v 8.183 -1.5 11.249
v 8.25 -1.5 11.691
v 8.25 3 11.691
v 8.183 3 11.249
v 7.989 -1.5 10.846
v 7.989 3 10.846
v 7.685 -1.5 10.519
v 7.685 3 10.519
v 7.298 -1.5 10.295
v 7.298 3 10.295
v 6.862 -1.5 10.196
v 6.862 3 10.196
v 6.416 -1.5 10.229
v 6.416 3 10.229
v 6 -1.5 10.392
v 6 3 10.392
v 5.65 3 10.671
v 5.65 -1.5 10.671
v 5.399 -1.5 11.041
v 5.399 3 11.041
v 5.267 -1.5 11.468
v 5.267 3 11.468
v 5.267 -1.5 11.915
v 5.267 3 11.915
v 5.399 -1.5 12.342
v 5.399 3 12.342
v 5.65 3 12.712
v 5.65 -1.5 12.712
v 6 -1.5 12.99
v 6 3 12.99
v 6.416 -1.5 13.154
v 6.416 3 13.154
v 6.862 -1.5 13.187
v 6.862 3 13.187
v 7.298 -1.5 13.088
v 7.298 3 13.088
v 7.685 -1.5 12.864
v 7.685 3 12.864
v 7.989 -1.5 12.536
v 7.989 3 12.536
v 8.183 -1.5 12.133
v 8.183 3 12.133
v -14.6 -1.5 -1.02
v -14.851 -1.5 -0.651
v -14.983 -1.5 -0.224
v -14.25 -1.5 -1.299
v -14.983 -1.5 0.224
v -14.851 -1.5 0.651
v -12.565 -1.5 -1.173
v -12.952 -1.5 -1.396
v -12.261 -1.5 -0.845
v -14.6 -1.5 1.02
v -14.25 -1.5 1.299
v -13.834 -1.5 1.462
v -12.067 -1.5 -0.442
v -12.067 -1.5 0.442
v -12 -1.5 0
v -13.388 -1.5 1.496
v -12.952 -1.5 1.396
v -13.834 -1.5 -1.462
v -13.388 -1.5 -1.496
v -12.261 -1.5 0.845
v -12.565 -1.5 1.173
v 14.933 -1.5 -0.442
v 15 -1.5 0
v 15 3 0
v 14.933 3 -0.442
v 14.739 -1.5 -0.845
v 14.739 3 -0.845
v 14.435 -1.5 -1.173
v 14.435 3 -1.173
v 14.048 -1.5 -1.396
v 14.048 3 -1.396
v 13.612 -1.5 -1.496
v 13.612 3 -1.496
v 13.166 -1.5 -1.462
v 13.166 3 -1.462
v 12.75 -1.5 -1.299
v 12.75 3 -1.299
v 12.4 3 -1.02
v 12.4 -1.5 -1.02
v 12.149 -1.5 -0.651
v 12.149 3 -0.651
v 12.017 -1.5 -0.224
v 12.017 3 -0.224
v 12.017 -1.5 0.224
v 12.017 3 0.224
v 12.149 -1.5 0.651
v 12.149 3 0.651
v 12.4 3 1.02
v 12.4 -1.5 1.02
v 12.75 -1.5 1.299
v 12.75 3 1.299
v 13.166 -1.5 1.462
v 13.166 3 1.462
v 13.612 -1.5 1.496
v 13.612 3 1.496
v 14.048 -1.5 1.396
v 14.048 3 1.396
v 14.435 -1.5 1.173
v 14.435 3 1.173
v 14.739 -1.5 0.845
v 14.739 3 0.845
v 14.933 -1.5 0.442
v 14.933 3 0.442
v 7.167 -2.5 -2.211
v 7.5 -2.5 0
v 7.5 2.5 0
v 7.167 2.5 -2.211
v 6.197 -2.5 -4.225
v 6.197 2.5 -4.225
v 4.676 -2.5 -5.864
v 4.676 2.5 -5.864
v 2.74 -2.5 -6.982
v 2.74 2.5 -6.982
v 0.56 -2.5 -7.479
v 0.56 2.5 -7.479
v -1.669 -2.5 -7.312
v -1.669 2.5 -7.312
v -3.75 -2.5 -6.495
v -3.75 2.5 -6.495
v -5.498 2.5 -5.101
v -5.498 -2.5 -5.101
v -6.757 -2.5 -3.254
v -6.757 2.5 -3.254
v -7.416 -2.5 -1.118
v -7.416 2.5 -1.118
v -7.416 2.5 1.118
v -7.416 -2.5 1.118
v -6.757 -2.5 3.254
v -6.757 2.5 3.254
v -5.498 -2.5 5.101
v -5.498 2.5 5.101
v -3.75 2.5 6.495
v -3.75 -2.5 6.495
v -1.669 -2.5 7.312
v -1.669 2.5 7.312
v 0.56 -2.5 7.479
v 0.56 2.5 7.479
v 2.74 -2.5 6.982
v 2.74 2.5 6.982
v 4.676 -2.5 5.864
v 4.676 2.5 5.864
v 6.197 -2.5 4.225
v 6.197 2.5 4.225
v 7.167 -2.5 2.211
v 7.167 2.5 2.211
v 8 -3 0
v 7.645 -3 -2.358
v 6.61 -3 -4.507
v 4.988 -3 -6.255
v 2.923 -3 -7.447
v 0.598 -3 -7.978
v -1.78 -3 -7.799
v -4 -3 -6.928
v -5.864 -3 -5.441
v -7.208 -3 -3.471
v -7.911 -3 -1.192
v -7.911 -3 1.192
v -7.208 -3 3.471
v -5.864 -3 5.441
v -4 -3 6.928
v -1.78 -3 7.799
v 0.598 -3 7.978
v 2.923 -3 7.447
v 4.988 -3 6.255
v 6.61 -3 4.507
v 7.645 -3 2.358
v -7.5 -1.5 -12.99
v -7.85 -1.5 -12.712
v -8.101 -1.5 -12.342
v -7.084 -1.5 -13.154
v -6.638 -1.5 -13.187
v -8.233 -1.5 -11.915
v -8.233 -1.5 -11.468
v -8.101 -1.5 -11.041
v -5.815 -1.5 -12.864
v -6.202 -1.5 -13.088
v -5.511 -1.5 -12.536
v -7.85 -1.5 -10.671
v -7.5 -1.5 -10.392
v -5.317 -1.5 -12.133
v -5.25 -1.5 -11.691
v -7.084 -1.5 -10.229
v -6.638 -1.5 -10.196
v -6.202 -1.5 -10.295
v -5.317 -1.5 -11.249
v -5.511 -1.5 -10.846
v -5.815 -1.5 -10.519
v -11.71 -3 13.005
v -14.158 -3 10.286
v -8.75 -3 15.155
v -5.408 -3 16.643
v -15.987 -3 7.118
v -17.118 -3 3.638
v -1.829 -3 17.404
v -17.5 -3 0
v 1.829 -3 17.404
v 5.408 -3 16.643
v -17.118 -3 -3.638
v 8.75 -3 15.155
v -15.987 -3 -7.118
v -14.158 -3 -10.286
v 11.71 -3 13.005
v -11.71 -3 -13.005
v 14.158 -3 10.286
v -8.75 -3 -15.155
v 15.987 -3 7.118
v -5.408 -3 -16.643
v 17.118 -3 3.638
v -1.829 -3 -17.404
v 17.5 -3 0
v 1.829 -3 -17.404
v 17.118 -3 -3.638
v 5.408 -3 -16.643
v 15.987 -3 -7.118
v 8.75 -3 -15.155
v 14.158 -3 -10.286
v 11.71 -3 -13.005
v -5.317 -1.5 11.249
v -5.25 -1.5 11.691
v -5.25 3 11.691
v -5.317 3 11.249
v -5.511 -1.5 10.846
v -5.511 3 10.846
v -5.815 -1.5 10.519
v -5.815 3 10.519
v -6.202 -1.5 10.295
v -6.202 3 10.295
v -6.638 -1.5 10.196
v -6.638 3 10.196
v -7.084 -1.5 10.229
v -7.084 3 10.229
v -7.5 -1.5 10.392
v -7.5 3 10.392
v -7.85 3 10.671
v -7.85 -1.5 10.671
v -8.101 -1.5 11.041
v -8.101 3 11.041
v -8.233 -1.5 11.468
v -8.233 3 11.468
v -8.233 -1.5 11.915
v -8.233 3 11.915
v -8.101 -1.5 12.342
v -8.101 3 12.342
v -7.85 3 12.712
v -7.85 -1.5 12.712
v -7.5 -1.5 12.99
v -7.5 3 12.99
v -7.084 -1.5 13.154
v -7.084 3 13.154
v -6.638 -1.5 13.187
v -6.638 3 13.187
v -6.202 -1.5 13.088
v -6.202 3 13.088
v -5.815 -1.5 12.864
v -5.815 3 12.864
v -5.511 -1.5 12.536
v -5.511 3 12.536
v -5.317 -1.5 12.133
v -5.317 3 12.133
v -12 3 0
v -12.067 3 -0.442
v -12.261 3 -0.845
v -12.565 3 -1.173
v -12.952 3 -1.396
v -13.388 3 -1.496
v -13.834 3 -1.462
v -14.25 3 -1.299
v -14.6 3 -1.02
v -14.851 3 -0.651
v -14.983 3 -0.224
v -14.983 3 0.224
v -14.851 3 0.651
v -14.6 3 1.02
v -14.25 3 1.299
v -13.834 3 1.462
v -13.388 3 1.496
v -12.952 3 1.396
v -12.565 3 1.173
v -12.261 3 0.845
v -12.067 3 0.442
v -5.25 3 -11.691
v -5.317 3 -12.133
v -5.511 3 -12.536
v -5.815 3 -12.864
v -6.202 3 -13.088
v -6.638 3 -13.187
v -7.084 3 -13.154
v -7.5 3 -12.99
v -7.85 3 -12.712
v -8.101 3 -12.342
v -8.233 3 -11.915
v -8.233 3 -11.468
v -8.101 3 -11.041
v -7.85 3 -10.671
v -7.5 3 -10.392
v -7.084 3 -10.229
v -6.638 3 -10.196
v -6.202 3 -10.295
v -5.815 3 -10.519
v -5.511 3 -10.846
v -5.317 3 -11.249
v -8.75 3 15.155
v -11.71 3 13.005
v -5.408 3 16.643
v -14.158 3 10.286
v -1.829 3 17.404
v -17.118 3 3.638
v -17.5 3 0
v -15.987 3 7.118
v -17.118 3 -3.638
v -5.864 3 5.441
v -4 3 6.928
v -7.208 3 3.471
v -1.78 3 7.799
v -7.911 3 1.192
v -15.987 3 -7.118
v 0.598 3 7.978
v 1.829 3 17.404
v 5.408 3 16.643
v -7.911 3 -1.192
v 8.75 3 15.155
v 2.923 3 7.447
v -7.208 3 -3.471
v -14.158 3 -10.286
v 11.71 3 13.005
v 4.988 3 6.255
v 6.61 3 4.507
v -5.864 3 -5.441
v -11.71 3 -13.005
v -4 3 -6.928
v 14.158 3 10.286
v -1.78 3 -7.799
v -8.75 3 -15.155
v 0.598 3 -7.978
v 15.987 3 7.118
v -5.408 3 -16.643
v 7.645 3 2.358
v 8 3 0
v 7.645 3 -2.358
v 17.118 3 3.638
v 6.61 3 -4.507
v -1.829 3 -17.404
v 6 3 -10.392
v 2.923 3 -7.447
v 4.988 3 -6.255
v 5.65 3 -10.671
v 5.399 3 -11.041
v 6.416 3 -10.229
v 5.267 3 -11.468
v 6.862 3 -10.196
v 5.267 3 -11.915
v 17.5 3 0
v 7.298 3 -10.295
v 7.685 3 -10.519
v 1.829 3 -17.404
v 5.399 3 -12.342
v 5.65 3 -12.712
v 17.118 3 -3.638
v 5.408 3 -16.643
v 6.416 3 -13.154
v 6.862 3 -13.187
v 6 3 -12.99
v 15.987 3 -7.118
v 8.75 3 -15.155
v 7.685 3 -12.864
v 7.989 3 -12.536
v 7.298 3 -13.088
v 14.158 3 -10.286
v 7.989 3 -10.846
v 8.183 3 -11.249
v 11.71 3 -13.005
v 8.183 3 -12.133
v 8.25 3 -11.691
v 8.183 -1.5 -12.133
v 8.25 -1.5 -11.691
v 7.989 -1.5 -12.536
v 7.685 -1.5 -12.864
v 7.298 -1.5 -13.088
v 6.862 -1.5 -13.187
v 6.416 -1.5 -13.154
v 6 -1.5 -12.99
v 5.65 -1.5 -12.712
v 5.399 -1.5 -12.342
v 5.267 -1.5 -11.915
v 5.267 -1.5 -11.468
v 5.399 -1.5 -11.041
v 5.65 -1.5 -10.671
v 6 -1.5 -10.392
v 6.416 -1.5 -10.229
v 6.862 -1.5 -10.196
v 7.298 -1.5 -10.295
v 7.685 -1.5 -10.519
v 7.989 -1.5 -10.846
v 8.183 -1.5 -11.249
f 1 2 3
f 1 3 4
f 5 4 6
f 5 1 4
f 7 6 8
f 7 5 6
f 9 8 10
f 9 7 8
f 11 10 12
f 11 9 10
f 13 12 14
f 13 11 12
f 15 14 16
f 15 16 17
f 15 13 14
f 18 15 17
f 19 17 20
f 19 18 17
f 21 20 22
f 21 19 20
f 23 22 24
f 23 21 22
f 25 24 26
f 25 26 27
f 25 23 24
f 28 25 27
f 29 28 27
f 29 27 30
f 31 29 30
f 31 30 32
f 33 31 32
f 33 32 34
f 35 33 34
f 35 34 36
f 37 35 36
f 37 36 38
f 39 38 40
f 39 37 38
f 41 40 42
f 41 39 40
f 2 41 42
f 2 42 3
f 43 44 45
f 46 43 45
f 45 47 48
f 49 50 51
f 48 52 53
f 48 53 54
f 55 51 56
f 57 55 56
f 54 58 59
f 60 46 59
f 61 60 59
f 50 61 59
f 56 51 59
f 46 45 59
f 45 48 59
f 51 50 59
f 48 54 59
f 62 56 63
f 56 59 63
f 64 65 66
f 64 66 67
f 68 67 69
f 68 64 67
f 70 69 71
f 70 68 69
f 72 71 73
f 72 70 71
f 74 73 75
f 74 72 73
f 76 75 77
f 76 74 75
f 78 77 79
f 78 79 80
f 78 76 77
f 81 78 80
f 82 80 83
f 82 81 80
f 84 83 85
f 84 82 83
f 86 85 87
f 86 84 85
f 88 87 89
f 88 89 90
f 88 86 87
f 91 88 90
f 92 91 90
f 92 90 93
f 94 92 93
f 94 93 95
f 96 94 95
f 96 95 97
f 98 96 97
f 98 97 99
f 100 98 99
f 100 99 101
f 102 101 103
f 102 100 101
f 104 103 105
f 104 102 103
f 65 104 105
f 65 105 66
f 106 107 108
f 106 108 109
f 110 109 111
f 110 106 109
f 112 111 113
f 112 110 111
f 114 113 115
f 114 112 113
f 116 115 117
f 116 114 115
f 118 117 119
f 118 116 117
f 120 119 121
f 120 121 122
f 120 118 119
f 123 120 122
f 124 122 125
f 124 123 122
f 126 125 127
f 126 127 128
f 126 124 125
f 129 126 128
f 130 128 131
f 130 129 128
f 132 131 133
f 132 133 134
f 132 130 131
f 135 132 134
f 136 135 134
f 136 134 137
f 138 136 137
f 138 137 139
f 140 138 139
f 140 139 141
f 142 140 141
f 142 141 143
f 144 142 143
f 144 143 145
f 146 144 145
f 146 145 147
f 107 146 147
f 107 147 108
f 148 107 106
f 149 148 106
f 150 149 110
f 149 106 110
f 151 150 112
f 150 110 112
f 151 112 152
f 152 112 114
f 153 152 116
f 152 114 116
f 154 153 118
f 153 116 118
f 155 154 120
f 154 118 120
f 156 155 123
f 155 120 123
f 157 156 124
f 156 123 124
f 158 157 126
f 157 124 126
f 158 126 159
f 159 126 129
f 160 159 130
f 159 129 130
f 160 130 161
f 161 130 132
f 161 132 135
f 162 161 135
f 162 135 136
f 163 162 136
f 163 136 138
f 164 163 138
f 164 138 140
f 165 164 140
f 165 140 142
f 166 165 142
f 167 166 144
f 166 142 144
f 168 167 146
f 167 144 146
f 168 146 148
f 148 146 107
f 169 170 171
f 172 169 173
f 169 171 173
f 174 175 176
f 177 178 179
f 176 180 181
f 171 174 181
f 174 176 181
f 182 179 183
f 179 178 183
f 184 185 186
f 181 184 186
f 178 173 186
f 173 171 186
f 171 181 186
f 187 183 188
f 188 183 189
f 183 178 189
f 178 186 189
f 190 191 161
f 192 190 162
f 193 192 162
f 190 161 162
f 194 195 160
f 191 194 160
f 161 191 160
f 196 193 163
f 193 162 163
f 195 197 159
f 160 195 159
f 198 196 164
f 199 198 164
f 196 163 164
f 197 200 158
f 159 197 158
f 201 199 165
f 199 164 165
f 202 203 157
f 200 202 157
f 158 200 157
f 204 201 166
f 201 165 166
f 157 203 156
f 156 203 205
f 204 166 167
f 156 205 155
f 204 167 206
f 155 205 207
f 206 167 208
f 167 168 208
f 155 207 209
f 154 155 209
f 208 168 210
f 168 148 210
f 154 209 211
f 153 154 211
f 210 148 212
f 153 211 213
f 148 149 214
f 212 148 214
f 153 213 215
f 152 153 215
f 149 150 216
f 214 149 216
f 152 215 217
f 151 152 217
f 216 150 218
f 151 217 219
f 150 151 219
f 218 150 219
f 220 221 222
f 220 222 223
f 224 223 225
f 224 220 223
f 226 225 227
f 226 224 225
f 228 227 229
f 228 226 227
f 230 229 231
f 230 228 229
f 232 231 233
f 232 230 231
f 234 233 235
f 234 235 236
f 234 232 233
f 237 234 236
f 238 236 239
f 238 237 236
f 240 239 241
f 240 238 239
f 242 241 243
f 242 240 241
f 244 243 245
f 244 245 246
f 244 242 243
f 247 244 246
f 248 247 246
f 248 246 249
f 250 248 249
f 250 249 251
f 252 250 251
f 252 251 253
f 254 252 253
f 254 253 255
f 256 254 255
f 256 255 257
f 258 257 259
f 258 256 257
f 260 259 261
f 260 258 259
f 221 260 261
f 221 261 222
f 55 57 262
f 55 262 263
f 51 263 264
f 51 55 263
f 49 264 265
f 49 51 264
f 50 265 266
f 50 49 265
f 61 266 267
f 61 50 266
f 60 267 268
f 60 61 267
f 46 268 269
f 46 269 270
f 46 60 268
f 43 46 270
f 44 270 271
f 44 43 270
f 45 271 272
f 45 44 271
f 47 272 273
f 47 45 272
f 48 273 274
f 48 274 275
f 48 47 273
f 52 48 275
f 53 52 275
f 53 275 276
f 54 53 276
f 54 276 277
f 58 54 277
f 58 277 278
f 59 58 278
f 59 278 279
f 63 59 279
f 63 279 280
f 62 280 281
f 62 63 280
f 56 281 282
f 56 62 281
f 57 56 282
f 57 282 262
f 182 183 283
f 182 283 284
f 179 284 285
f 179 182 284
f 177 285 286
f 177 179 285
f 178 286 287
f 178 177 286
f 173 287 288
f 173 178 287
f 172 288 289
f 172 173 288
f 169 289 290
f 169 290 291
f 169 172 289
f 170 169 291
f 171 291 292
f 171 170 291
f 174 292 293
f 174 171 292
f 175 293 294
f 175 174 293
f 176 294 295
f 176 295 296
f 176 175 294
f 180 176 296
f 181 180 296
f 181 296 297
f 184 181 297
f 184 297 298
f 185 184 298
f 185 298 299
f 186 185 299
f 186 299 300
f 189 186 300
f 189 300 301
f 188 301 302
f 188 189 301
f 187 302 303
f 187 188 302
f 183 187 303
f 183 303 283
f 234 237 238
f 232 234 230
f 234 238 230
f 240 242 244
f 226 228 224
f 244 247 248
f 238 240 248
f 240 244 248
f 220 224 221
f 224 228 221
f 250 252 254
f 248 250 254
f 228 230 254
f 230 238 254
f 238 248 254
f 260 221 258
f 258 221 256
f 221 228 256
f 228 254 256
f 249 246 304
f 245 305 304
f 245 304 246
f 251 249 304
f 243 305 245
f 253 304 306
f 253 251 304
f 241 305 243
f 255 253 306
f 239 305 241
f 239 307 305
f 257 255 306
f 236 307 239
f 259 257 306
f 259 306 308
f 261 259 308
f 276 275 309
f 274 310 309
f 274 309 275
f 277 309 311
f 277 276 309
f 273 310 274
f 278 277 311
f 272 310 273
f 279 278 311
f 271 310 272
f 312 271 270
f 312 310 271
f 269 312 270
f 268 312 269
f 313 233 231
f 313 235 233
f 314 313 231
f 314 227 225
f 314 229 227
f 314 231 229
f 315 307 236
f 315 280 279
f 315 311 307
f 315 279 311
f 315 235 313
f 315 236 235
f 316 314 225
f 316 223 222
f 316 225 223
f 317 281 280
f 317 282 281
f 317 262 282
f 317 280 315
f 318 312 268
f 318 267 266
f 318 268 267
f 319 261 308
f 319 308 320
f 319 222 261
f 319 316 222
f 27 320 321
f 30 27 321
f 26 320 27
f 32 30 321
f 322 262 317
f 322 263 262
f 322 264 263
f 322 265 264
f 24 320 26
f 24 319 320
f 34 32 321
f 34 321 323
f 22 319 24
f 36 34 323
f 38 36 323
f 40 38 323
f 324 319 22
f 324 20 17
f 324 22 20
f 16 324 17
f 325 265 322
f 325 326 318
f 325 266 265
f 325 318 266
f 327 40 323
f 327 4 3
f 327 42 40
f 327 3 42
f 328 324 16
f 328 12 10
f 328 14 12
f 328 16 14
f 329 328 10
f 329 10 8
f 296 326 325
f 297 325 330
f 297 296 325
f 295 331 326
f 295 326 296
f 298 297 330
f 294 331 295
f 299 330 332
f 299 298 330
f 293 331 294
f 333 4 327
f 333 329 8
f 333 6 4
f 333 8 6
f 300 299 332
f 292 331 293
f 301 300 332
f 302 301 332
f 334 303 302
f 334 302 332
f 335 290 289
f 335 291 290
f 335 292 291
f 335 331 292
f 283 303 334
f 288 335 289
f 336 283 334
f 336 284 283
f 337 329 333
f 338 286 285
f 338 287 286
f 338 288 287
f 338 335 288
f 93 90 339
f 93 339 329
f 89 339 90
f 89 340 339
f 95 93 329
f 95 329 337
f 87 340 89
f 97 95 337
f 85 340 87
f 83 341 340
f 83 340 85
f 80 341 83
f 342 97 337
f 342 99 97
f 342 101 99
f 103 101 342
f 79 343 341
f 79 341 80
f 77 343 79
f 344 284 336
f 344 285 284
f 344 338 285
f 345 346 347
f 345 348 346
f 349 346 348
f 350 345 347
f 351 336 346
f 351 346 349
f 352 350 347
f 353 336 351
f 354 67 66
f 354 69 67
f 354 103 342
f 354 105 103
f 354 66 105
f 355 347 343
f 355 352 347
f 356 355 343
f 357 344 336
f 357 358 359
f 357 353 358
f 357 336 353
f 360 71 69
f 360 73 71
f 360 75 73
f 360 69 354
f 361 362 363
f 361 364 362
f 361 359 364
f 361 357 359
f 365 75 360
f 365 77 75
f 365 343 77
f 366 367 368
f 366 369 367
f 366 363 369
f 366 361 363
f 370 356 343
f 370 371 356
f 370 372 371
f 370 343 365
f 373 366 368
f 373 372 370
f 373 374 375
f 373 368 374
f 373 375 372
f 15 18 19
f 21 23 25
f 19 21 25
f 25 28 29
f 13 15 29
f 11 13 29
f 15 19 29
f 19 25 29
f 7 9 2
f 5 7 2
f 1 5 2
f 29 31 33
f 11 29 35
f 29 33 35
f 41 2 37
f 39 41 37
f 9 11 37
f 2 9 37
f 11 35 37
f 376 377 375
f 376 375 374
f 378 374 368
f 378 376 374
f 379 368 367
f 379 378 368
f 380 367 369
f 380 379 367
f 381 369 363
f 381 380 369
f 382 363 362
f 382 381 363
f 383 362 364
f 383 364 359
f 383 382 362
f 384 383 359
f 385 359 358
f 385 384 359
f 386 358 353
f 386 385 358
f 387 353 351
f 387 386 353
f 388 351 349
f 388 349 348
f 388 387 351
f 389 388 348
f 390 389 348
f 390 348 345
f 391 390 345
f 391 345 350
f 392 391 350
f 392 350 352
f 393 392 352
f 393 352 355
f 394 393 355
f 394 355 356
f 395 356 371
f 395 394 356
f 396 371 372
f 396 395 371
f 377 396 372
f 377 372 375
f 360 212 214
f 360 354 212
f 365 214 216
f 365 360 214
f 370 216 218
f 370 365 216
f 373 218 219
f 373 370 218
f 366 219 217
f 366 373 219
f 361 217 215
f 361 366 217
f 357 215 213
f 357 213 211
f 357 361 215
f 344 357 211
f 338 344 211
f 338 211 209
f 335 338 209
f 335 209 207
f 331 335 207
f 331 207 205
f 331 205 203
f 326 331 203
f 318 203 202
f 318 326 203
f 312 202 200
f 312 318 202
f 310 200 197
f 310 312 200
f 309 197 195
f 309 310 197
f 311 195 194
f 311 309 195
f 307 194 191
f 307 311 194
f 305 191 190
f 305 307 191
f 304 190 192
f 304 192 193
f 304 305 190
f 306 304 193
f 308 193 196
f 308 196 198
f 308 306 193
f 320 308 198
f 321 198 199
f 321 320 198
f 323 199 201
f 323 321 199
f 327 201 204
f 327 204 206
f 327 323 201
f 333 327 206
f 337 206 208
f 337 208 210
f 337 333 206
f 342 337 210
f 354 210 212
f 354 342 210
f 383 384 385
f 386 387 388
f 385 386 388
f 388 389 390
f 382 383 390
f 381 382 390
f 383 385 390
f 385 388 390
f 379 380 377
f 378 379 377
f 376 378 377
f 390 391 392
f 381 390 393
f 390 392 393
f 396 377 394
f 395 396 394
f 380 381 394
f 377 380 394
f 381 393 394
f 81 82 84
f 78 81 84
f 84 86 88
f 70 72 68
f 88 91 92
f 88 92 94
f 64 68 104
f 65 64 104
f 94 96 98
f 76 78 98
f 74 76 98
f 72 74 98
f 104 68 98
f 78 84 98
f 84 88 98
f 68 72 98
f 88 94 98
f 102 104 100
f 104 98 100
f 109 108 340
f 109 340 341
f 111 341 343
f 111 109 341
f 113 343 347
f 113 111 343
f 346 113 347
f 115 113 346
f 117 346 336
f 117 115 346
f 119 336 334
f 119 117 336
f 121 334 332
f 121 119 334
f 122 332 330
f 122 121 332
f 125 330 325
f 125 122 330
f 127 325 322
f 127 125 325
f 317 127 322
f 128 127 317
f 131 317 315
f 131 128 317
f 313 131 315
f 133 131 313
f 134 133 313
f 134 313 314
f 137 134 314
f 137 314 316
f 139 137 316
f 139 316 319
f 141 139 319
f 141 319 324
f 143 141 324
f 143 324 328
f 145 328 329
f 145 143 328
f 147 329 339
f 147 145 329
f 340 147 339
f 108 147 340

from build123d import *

# Parameters (mm, degrees)
SKETCH1_R           = 17.5
SKETCH1_R_2         = 1.5
SKETCH1_R_3         = 7.5
BOSS_EXTRUDE1_DEPTH = 3
SKETCH3_R           = 15
SKETCH3_R_2         = 12
BOSS_EXTRUDE2_DEPTH = 1.5
CHAMFER1_SIZE       = 0.5


with BuildPart() as part:
    # Sketch1 → Boss-Extrude1 (new body, symmetric)
    with BuildSketch(Plane(origin=(0, 0, 0), x_dir=(1, 0, 0), z_dir=(0, 1, 0))):
        Circle(SKETCH1_R)
        with Locations((13.5, 0)):
            Circle(SKETCH1_R_2, mode=Mode.SUBTRACT)
        with Locations((6.75, -11.691342951)):
            Circle(SKETCH1_R_2, mode=Mode.SUBTRACT)
        with Locations((-6.75, -11.691342951)):
            Circle(SKETCH1_R_2, mode=Mode.SUBTRACT)
        with Locations((-13.5, 0)):
            Circle(SKETCH1_R_2, mode=Mode.SUBTRACT)
        with Locations((-6.75, 11.691342951)):
            Circle(SKETCH1_R_2, mode=Mode.SUBTRACT)
        with Locations((6.75, 11.691342951)):
            Circle(SKETCH1_R_2, mode=Mode.SUBTRACT)
        Circle(SKETCH1_R_3, mode=Mode.SUBTRACT)
    extrude(amount=BOSS_EXTRUDE1_DEPTH, both=True)

    # Sketch3 → Boss-Extrude2 (add)
    with BuildSketch(Plane.XZ.offset(3)):
        Circle(SKETCH3_R)
        Circle(SKETCH3_R_2, mode=Mode.SUBTRACT)
    extrude(amount=-BOSS_EXTRUDE2_DEPTH)

    # Chamfer1
    chamfer1_edges = [part.edges().sort_by_distance(p)[0] for p in [
        (-7.5, -3, 0),
        (-7.5, 3, 0),
    ]]
    chamfer(chamfer1_edges, length=CHAMFER1_SIZE)


solid = part.part
